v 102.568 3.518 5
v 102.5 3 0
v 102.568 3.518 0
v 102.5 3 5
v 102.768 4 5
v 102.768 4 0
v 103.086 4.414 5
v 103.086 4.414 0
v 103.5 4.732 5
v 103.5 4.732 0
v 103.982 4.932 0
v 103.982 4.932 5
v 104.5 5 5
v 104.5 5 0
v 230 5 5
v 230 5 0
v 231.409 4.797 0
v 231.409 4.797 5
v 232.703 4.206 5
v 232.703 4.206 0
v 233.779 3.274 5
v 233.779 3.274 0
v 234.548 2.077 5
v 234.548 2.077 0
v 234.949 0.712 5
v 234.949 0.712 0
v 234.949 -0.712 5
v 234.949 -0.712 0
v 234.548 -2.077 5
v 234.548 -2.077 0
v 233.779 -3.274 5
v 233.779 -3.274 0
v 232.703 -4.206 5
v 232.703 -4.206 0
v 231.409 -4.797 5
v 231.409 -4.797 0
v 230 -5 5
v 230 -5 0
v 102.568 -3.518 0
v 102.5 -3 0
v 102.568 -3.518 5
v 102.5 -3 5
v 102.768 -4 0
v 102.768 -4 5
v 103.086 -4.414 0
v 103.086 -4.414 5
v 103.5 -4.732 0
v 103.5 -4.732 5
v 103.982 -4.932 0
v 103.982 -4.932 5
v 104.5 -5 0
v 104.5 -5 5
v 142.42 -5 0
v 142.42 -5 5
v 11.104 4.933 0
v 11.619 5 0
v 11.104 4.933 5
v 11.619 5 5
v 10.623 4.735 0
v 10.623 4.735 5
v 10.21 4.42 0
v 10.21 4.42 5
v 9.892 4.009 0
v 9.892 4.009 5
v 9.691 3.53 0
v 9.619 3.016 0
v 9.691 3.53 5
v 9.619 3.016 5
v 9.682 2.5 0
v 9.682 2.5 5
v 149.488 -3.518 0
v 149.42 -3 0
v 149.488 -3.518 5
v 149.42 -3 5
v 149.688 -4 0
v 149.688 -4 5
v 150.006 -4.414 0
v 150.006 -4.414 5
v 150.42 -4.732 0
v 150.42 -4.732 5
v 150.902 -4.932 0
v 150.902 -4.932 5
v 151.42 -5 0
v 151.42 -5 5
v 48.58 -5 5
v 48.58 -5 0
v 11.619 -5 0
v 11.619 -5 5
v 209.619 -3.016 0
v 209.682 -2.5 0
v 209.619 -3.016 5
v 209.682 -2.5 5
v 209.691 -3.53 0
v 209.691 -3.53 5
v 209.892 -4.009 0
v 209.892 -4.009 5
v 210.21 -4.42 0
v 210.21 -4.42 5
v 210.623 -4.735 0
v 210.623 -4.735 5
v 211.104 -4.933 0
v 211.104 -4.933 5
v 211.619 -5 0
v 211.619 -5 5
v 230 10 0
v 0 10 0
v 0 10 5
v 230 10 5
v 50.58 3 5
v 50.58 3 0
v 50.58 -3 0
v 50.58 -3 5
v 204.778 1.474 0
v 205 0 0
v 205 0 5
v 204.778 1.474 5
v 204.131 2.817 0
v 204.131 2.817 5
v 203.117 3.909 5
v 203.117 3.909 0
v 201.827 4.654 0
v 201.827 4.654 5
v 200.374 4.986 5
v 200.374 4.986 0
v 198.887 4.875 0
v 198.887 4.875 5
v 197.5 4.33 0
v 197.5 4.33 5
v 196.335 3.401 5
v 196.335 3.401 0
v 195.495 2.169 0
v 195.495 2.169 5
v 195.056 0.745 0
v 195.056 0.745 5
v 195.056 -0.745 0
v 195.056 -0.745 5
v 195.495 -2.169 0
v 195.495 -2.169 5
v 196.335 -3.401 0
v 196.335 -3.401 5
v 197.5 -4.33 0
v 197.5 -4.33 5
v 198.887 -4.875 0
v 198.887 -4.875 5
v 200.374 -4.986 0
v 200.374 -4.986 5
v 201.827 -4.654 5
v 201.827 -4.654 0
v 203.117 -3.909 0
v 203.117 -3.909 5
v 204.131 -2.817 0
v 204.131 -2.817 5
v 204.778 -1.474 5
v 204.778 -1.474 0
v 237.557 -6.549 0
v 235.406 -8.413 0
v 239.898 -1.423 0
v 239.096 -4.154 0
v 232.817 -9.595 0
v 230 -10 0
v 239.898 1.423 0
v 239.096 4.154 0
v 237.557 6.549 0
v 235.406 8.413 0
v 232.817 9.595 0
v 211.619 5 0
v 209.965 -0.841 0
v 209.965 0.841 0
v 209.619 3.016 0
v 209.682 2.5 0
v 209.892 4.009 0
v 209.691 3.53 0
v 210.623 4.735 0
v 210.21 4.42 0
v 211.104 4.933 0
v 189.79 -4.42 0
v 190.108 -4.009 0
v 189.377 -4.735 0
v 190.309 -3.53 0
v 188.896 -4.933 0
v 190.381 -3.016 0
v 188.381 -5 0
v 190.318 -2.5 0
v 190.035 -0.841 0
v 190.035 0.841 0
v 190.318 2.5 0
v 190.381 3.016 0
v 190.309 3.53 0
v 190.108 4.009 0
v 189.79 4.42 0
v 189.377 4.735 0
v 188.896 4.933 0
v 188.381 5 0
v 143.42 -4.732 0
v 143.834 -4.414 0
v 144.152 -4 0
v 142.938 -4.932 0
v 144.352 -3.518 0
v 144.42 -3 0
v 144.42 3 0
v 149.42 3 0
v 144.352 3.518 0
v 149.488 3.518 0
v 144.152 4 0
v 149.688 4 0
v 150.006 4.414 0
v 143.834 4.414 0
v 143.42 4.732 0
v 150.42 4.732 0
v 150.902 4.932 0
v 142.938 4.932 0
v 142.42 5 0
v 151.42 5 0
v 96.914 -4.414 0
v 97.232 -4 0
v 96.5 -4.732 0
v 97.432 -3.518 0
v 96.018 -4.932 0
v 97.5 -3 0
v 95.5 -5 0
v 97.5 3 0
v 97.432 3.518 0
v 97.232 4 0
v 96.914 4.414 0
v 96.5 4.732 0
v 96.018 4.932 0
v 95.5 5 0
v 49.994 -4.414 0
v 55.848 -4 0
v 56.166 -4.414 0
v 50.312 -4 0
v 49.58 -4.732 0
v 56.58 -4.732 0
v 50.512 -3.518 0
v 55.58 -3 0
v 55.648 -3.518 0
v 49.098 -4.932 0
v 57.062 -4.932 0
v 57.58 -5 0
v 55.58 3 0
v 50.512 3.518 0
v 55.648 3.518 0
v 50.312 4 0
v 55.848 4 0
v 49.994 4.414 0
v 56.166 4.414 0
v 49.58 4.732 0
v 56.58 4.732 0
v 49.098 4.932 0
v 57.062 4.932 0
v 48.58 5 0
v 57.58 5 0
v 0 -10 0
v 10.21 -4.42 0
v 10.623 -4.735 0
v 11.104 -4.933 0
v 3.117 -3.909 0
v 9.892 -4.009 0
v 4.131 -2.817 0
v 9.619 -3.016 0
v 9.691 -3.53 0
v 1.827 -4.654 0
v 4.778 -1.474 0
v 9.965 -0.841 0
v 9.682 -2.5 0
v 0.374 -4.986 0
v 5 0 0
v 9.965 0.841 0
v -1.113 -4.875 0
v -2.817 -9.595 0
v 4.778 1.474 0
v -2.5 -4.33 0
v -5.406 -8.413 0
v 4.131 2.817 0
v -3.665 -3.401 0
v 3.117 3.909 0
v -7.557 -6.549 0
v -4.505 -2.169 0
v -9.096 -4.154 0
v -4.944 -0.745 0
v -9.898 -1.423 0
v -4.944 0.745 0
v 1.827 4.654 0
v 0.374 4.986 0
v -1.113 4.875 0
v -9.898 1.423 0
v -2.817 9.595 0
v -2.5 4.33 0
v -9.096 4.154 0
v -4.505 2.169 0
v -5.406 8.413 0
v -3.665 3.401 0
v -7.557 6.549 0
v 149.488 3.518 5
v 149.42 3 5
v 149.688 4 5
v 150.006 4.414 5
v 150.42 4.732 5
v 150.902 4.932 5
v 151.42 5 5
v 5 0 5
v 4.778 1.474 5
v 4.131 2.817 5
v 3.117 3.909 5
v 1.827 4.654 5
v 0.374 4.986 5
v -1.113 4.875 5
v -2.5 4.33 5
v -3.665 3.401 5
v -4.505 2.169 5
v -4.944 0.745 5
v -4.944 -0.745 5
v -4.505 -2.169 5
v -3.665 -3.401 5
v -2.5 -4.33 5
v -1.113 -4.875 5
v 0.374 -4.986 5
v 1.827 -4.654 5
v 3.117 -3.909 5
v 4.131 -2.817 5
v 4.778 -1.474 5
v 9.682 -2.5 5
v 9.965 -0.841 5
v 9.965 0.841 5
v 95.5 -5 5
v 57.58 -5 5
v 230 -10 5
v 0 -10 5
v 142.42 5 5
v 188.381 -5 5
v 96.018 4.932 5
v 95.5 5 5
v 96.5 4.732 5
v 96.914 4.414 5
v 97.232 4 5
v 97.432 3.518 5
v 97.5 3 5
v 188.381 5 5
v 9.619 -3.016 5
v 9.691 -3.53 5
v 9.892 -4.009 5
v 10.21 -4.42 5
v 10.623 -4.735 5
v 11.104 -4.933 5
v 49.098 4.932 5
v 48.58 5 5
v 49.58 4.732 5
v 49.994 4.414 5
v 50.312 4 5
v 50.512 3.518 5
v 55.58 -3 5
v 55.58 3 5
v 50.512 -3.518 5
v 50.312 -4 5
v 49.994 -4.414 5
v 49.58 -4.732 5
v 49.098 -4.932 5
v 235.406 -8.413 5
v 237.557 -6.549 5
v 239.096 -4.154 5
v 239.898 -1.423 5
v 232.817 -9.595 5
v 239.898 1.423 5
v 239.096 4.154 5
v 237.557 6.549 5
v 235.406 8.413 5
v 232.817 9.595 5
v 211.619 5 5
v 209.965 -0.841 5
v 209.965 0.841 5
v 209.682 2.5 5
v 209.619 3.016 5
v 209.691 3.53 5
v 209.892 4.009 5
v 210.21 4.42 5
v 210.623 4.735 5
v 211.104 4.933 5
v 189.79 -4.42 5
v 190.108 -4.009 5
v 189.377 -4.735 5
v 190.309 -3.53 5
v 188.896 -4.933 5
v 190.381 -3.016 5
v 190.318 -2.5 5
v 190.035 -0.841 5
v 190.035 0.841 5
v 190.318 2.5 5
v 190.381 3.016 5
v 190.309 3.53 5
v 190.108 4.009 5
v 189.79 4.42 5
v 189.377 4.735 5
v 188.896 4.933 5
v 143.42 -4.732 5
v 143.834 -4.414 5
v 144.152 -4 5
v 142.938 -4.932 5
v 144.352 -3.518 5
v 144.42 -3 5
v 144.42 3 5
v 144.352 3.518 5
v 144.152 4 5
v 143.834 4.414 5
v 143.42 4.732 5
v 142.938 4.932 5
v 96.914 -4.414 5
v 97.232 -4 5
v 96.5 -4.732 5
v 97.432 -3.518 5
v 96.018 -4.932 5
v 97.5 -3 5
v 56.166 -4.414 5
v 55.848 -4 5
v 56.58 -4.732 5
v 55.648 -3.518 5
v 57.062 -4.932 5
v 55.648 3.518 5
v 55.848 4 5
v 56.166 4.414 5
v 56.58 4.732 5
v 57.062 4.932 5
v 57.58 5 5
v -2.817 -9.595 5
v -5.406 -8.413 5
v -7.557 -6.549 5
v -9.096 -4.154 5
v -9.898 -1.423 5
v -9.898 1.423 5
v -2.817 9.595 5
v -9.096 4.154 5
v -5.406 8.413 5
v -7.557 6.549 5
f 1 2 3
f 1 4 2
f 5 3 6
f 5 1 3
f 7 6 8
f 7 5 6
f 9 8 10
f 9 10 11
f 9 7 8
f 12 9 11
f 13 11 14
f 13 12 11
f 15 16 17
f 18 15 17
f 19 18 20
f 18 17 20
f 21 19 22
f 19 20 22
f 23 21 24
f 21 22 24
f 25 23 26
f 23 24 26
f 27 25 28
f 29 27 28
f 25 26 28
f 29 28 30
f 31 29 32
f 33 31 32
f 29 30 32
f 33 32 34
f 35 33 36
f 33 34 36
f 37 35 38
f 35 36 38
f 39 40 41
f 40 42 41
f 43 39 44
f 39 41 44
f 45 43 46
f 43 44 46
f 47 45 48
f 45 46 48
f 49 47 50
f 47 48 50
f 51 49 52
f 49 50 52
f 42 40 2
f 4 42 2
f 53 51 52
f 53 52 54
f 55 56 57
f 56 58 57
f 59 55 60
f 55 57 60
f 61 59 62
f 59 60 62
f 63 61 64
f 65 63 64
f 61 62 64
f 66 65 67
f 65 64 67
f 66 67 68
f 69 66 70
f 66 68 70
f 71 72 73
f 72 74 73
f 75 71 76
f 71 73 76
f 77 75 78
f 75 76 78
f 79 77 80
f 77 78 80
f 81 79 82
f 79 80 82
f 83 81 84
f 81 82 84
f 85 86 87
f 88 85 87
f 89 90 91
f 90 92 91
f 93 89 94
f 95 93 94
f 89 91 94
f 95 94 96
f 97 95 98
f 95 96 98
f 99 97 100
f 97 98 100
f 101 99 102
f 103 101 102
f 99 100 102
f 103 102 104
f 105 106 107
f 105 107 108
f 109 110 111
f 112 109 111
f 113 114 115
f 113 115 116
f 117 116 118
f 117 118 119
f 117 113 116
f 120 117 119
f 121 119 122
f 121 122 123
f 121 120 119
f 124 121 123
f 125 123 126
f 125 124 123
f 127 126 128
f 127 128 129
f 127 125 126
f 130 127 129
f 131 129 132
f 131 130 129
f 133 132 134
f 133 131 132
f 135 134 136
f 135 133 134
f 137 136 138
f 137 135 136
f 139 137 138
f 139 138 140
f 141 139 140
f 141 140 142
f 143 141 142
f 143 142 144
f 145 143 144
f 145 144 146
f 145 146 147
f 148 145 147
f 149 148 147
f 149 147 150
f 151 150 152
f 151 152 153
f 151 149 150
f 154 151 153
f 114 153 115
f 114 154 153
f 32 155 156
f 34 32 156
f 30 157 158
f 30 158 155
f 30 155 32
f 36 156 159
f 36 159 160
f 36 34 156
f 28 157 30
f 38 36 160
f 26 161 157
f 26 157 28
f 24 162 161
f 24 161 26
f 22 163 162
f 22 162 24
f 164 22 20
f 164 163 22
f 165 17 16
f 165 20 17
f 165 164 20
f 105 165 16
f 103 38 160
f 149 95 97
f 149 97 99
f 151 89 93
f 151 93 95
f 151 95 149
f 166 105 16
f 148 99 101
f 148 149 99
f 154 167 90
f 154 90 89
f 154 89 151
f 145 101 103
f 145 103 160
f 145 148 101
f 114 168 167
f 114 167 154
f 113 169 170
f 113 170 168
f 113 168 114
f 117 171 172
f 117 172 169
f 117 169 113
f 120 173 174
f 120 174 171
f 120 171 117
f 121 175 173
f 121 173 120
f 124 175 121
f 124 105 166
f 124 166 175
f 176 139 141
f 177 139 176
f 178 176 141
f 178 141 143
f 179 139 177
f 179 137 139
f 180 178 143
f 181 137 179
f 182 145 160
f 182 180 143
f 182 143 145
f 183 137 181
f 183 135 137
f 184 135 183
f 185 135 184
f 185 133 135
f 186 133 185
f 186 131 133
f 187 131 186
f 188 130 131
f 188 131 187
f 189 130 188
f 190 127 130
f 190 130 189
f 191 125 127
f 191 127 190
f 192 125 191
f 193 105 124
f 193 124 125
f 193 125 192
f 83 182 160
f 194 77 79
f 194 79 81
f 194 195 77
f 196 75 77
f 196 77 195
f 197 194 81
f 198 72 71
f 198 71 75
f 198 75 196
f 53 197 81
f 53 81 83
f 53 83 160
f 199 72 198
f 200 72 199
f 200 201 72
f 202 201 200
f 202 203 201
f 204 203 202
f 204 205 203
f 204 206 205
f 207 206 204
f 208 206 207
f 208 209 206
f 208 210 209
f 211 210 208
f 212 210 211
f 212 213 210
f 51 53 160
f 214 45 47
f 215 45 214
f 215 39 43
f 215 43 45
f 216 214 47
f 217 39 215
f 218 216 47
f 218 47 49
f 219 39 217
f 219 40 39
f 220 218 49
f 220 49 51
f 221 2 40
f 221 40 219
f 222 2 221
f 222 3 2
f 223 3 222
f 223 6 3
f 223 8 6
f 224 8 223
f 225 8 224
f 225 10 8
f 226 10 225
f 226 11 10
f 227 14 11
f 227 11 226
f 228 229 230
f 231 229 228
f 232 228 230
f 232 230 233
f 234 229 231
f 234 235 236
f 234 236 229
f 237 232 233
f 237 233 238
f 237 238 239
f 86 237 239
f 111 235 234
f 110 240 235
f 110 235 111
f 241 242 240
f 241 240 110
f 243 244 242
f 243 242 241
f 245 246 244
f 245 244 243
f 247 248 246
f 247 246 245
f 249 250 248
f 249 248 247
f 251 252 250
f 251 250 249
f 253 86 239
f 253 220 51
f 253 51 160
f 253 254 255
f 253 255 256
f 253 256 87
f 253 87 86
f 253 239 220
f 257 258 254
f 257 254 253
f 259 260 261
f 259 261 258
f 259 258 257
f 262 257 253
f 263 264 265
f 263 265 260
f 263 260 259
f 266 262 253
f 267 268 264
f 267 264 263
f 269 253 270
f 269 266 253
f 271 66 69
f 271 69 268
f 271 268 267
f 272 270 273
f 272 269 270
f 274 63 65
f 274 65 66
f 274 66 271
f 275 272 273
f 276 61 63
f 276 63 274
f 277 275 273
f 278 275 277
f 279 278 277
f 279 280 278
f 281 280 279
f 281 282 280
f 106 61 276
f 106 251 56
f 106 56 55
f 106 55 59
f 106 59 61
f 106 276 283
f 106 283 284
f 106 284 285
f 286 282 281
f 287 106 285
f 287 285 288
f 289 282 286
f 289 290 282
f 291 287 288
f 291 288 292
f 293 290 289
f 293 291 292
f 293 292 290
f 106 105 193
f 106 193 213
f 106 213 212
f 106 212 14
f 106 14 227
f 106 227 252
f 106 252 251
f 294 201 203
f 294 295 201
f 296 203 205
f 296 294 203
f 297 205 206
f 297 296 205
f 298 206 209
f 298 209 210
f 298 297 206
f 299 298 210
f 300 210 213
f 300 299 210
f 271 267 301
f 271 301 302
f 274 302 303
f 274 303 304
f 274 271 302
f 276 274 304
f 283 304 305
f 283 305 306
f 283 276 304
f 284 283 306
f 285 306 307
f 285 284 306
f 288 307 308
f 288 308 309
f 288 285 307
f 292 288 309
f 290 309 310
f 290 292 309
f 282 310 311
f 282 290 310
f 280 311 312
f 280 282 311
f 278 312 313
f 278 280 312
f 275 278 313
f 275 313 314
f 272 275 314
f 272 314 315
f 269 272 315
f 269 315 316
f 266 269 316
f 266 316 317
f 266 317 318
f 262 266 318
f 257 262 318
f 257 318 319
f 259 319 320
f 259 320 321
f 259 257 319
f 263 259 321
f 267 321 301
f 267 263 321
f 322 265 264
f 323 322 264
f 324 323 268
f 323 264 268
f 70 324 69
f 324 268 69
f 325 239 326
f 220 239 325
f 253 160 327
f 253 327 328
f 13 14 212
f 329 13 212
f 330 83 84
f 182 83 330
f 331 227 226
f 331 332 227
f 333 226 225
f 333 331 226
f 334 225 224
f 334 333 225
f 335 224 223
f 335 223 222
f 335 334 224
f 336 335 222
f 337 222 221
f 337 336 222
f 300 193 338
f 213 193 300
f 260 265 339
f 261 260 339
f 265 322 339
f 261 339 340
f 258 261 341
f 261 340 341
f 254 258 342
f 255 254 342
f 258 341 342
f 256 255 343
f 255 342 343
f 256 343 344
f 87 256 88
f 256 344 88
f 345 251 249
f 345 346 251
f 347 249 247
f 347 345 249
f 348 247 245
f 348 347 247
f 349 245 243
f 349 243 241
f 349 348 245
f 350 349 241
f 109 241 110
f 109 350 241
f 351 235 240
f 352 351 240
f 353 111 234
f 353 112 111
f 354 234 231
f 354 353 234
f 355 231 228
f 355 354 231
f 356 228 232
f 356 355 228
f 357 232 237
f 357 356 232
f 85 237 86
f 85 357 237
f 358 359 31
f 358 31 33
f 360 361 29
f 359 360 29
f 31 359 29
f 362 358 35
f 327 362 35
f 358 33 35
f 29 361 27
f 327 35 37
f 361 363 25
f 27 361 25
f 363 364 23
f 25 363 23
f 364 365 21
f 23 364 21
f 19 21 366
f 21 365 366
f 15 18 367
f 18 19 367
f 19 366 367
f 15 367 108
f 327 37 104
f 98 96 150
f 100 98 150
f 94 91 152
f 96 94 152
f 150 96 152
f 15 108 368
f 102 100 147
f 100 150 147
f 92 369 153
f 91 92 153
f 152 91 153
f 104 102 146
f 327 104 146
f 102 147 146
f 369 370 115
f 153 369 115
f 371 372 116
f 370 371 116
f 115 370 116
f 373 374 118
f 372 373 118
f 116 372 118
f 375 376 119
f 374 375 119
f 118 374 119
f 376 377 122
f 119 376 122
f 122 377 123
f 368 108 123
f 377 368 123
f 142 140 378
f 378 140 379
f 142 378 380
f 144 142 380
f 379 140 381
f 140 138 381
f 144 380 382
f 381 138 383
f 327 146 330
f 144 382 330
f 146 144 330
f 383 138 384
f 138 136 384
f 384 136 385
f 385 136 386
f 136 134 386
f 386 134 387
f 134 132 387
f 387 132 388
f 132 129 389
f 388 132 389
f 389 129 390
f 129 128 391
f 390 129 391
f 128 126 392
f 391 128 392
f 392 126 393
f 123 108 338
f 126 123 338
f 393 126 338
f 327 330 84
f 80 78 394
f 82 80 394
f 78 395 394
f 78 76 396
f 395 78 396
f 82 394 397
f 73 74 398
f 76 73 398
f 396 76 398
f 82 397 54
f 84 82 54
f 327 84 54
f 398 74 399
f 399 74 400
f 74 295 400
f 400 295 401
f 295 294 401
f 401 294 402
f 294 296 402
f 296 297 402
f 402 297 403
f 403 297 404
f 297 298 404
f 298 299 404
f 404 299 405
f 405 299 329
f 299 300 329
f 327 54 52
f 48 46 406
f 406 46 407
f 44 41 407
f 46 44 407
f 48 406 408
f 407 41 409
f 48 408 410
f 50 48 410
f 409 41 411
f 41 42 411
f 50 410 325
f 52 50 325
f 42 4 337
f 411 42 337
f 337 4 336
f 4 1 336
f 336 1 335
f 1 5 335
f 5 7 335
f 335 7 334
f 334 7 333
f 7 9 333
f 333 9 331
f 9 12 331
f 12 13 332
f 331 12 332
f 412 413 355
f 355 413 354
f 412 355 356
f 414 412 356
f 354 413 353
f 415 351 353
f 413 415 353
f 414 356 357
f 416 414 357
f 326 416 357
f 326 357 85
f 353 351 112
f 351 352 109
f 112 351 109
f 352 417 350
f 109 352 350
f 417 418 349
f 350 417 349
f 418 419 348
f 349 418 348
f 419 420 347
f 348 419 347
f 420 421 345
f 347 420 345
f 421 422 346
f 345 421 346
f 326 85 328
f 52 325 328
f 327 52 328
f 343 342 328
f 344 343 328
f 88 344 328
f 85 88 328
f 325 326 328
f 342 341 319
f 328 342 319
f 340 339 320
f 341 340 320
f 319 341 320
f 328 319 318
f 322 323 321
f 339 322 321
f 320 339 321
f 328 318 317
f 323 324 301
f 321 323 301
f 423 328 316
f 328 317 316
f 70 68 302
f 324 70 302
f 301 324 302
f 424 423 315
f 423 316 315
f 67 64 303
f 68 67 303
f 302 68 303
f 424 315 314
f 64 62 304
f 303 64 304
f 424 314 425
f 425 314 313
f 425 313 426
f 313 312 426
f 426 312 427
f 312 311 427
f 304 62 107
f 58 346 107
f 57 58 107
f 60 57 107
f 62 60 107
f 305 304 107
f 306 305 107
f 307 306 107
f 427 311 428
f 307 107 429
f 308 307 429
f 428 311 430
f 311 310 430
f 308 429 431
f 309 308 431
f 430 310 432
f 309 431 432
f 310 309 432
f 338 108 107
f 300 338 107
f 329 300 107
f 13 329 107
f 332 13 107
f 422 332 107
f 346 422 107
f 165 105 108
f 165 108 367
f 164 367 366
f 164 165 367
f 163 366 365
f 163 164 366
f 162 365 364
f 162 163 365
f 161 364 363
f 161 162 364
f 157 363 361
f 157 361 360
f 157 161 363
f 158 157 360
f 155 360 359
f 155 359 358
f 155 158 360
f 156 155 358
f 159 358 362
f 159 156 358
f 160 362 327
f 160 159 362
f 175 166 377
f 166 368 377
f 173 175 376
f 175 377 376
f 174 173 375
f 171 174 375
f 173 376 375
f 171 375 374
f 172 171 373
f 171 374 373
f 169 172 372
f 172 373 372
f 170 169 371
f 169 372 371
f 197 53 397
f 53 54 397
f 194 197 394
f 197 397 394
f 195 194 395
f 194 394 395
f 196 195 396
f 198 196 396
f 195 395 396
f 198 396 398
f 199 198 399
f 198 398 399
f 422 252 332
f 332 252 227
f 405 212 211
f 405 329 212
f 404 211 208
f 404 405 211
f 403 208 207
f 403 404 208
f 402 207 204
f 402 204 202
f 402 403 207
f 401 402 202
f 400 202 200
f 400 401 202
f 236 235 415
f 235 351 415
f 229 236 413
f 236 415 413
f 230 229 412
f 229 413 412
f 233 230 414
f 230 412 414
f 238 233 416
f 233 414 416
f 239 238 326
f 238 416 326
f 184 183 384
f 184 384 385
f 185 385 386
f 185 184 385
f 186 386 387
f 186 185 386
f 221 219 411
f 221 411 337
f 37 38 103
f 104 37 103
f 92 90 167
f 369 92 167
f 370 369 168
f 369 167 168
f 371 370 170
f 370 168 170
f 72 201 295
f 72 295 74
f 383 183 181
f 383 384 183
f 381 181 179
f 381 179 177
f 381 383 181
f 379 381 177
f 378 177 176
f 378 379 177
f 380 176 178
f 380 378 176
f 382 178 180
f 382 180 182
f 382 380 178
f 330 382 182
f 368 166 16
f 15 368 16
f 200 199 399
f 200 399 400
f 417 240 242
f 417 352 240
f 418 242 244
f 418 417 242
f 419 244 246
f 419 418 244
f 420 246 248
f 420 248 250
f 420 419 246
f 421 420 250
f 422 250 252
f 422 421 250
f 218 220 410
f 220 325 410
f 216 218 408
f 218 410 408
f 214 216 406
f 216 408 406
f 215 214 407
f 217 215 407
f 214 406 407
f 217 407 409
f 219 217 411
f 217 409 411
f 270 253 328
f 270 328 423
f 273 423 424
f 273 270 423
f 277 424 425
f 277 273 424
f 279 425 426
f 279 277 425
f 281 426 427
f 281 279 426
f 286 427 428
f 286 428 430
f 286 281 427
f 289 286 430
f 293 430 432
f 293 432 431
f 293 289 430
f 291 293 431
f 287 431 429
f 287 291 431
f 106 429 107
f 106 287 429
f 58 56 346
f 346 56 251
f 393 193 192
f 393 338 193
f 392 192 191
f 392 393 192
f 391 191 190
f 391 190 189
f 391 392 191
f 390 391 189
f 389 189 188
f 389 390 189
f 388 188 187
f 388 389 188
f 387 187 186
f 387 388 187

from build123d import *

# Parameters (mm, degrees)
SKETCH_1_R      = 5
SKETCH_1_W      = 41.919872981
SKETCH_1_H      = 10
EXTRUDE_1_DEPTH = 5
FILLET_1_R      = 2
FILLET_2_R      = 2


with BuildPart() as part:
    # 草图1 → 凸台-拉伸1 (new body)
    with BuildSketch(Plane.XY):
        with BuildLine():
            Line((0, 10), (230, 10))
            ThreePointArc((230, 10), (240, 0), (230, -10))
            Line((230, -10), (0, -10))
            ThreePointArc((0, -10), (-10, 0), (0, 10))
        make_face()
        Circle(SKETCH_1_R, mode=Mode.SUBTRACT)
        with Locations((200, 0)):
            Circle(SKETCH_1_R, mode=Mode.SUBTRACT)
        with BuildLine():
            Line((8.660254038, 5), (50.580127019, 5))
            Line((50.580127019, 5), (50.580127019, -5))
            Line((50.580127019, -5), (8.660254038, -5))
            ThreePointArc((8.660254038, -5), (10, 0), (8.660254038, 5))
        make_face(mode=Mode.SUBTRACT)
        with BuildLine():
            Line((208.660254038, 5), (230, 5))
            ThreePointArc((230, 5), (235, 0), (230, -5))
            Line((230, -5), (208.660254038, -5))
            ThreePointArc((208.660254038, -5), (210, 0), (208.660254038, 5))
        make_face(mode=Mode.SUBTRACT)
        with Locations((123.45993649, 0)):
            Rectangle(SKETCH_1_W, SKETCH_1_H, mode=Mode.SUBTRACT)
        with Locations((76.54006351, 0)):
            Rectangle(SKETCH_1_W, SKETCH_1_H, mode=Mode.SUBTRACT)
        with BuildLine():
            Line((149.419872981, -5), (191.339745962, -5))
            ThreePointArc((191.339745962, -5), (190, 0), (191.339745962, 5))
            Line((191.339745962, 5), (149.419872981, 5))
            Line((149.419872981, 5), (149.419872981, -5))
        make_face(mode=Mode.SUBTRACT)
    extrude(amount=EXTRUDE_1_DEPTH)

    # 圆角1
    fillet_1_edges = [part.edges().sort_by_distance(p)[0] for p in [
        (50.580127019, 5, 2.5),
    ]]
    fillet(fillet_1_edges, radius=FILLET_1_R)

    # 圆角2
    fillet_2_edges = [part.edges().sort_by_distance(p)[0] for p in [
        (208.660254038, 5, 2.5),
        (208.660254038, -5, 2.5),
        (144.419872981, 5, 2.5),
        (102.5, 5, 2.5),
        (102.5, -5, 2.5),
        (144.419872981, -5, 2.5),
        (191.339745962, -5, 2.5),
        (191.339745962, 5, 2.5),
        (149.419872981, 5, 2.5),
        (149.419872981, -5, 2.5),
        (8.660254038, 5, 2.5),
        (8.660254038, -5, 2.5),
        (50.580127019, -5, 2.5),
        (97.5, 5, 2.5),
        (55.580127019, 5, 2.5),
        (55.580127019, -5, 2.5),
        (97.5, -5, 2.5),
    ]]
    fillet(fillet_2_edges, radius=FILLET_2_R)


solid = part.part
